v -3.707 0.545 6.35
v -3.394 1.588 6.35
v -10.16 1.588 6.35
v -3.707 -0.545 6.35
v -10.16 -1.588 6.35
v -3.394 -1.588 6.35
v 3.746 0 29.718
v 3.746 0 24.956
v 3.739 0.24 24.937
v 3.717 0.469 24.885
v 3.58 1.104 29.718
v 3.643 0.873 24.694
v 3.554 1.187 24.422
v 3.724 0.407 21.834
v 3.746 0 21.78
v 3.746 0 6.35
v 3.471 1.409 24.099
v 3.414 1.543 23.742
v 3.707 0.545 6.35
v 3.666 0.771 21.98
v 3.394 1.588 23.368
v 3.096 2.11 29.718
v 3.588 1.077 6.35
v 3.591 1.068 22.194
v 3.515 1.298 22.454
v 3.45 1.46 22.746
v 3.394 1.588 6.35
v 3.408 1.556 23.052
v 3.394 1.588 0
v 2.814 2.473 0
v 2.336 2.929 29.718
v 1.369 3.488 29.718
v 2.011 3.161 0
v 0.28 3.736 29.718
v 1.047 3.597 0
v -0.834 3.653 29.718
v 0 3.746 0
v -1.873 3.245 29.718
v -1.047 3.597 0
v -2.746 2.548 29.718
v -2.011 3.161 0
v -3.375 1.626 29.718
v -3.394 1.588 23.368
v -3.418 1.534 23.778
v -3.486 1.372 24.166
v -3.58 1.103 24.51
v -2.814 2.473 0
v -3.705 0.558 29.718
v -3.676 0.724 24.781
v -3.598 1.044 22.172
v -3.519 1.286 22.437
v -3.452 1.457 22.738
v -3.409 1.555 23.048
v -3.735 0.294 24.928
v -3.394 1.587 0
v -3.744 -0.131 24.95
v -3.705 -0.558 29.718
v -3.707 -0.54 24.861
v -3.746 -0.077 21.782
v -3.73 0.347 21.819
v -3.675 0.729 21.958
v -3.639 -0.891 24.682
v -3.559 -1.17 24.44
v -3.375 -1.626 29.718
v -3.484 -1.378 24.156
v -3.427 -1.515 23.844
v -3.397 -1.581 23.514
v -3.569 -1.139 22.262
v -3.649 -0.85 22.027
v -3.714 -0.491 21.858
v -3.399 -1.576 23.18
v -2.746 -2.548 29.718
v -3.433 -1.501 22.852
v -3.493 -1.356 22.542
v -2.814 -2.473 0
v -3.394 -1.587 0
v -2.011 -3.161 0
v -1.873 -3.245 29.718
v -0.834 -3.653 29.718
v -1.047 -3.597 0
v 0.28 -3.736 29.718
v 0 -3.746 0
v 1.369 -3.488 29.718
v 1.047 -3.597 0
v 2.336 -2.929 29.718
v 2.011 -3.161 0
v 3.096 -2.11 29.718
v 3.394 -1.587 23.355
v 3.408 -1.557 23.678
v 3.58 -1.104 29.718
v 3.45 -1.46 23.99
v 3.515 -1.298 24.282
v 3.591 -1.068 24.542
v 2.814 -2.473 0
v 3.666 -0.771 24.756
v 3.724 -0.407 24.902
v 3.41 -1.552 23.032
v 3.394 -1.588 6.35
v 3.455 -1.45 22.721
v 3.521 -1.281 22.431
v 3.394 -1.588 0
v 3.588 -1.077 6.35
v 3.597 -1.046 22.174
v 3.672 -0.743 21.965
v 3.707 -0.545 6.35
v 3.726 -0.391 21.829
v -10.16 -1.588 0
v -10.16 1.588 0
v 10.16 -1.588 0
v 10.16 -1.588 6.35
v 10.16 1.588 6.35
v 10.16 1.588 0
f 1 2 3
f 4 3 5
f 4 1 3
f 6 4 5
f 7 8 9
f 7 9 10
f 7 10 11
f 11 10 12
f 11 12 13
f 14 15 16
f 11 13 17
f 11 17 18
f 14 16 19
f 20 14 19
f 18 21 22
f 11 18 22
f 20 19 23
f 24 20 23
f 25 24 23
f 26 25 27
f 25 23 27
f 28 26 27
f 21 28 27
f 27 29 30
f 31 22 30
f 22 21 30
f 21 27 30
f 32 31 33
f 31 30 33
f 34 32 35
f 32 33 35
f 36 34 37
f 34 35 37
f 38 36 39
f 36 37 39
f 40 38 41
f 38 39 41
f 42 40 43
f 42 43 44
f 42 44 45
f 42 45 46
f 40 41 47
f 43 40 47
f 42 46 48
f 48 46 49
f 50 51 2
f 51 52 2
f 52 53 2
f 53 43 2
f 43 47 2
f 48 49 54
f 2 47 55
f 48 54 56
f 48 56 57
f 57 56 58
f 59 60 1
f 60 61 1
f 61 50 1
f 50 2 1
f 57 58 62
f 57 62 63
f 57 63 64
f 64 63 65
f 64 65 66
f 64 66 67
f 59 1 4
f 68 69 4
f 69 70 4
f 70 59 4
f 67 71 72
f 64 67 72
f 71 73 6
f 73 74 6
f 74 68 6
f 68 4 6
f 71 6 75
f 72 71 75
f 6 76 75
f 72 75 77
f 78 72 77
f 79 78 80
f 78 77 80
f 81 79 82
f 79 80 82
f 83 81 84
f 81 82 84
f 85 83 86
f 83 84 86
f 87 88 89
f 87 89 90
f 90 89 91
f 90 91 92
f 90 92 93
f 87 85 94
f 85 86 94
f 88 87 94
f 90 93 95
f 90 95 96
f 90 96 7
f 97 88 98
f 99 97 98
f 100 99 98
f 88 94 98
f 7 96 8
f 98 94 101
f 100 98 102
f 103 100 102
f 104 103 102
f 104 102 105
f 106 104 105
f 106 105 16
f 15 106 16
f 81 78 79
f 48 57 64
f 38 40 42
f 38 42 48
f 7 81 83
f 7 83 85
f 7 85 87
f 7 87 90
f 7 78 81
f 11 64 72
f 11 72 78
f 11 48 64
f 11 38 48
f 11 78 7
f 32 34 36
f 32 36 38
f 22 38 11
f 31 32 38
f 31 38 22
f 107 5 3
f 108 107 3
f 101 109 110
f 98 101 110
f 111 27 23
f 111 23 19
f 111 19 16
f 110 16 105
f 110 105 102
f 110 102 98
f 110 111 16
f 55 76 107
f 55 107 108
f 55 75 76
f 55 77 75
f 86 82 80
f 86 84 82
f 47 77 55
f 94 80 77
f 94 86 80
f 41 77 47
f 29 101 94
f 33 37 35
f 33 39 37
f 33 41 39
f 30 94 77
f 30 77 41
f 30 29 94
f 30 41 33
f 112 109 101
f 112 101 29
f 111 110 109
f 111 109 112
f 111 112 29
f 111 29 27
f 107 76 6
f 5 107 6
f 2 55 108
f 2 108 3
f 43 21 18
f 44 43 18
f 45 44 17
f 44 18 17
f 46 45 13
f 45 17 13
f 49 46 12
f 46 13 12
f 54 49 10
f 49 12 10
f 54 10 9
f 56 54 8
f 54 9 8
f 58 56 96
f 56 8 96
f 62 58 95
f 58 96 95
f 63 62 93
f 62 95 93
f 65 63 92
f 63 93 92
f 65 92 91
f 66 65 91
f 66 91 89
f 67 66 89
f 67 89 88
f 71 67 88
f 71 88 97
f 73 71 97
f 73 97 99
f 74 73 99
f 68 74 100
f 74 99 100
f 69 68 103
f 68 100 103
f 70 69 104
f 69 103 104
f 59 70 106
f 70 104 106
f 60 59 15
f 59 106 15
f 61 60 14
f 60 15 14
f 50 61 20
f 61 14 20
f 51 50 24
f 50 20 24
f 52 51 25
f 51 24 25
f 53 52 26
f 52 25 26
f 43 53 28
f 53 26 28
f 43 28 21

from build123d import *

# Parameters (mm, degrees)
F0_R     = 3.7465
F1_DEPTH = 29.718
F2_W     = 1.5875
F2_H     = 6.35
F3_DEPTH = 10.16
F4_R     = 1.5875
F5_DEPTH = 25.4


with BuildPart() as f1:
    # F0 (on Top) → F1 (new body)
    with BuildSketch(Plane.XY):
        Circle(F0_R)
    extrude(amount=F1_DEPTH)

    # F2 (on Right) → F3 (join, symmetric)
    with BuildSketch(Plane.YZ):
        with Locations((-0.79375, 3.175)):
            Rectangle(F2_W, F2_H)
        with Locations((0.79375, 3.175)):
            Rectangle(F2_W, F2_H)
    extrude(amount=F3_DEPTH, both=True)

    # F4 (on face) → F5 (cut)
    with BuildSketch(Plane.YZ.offset(10.16)):
        with Locations((0, 23.368)):
            Circle(F4_R)
    extrude(amount=-F5_DEPTH, mode=Mode.SUBTRACT)


solid = f1.part
